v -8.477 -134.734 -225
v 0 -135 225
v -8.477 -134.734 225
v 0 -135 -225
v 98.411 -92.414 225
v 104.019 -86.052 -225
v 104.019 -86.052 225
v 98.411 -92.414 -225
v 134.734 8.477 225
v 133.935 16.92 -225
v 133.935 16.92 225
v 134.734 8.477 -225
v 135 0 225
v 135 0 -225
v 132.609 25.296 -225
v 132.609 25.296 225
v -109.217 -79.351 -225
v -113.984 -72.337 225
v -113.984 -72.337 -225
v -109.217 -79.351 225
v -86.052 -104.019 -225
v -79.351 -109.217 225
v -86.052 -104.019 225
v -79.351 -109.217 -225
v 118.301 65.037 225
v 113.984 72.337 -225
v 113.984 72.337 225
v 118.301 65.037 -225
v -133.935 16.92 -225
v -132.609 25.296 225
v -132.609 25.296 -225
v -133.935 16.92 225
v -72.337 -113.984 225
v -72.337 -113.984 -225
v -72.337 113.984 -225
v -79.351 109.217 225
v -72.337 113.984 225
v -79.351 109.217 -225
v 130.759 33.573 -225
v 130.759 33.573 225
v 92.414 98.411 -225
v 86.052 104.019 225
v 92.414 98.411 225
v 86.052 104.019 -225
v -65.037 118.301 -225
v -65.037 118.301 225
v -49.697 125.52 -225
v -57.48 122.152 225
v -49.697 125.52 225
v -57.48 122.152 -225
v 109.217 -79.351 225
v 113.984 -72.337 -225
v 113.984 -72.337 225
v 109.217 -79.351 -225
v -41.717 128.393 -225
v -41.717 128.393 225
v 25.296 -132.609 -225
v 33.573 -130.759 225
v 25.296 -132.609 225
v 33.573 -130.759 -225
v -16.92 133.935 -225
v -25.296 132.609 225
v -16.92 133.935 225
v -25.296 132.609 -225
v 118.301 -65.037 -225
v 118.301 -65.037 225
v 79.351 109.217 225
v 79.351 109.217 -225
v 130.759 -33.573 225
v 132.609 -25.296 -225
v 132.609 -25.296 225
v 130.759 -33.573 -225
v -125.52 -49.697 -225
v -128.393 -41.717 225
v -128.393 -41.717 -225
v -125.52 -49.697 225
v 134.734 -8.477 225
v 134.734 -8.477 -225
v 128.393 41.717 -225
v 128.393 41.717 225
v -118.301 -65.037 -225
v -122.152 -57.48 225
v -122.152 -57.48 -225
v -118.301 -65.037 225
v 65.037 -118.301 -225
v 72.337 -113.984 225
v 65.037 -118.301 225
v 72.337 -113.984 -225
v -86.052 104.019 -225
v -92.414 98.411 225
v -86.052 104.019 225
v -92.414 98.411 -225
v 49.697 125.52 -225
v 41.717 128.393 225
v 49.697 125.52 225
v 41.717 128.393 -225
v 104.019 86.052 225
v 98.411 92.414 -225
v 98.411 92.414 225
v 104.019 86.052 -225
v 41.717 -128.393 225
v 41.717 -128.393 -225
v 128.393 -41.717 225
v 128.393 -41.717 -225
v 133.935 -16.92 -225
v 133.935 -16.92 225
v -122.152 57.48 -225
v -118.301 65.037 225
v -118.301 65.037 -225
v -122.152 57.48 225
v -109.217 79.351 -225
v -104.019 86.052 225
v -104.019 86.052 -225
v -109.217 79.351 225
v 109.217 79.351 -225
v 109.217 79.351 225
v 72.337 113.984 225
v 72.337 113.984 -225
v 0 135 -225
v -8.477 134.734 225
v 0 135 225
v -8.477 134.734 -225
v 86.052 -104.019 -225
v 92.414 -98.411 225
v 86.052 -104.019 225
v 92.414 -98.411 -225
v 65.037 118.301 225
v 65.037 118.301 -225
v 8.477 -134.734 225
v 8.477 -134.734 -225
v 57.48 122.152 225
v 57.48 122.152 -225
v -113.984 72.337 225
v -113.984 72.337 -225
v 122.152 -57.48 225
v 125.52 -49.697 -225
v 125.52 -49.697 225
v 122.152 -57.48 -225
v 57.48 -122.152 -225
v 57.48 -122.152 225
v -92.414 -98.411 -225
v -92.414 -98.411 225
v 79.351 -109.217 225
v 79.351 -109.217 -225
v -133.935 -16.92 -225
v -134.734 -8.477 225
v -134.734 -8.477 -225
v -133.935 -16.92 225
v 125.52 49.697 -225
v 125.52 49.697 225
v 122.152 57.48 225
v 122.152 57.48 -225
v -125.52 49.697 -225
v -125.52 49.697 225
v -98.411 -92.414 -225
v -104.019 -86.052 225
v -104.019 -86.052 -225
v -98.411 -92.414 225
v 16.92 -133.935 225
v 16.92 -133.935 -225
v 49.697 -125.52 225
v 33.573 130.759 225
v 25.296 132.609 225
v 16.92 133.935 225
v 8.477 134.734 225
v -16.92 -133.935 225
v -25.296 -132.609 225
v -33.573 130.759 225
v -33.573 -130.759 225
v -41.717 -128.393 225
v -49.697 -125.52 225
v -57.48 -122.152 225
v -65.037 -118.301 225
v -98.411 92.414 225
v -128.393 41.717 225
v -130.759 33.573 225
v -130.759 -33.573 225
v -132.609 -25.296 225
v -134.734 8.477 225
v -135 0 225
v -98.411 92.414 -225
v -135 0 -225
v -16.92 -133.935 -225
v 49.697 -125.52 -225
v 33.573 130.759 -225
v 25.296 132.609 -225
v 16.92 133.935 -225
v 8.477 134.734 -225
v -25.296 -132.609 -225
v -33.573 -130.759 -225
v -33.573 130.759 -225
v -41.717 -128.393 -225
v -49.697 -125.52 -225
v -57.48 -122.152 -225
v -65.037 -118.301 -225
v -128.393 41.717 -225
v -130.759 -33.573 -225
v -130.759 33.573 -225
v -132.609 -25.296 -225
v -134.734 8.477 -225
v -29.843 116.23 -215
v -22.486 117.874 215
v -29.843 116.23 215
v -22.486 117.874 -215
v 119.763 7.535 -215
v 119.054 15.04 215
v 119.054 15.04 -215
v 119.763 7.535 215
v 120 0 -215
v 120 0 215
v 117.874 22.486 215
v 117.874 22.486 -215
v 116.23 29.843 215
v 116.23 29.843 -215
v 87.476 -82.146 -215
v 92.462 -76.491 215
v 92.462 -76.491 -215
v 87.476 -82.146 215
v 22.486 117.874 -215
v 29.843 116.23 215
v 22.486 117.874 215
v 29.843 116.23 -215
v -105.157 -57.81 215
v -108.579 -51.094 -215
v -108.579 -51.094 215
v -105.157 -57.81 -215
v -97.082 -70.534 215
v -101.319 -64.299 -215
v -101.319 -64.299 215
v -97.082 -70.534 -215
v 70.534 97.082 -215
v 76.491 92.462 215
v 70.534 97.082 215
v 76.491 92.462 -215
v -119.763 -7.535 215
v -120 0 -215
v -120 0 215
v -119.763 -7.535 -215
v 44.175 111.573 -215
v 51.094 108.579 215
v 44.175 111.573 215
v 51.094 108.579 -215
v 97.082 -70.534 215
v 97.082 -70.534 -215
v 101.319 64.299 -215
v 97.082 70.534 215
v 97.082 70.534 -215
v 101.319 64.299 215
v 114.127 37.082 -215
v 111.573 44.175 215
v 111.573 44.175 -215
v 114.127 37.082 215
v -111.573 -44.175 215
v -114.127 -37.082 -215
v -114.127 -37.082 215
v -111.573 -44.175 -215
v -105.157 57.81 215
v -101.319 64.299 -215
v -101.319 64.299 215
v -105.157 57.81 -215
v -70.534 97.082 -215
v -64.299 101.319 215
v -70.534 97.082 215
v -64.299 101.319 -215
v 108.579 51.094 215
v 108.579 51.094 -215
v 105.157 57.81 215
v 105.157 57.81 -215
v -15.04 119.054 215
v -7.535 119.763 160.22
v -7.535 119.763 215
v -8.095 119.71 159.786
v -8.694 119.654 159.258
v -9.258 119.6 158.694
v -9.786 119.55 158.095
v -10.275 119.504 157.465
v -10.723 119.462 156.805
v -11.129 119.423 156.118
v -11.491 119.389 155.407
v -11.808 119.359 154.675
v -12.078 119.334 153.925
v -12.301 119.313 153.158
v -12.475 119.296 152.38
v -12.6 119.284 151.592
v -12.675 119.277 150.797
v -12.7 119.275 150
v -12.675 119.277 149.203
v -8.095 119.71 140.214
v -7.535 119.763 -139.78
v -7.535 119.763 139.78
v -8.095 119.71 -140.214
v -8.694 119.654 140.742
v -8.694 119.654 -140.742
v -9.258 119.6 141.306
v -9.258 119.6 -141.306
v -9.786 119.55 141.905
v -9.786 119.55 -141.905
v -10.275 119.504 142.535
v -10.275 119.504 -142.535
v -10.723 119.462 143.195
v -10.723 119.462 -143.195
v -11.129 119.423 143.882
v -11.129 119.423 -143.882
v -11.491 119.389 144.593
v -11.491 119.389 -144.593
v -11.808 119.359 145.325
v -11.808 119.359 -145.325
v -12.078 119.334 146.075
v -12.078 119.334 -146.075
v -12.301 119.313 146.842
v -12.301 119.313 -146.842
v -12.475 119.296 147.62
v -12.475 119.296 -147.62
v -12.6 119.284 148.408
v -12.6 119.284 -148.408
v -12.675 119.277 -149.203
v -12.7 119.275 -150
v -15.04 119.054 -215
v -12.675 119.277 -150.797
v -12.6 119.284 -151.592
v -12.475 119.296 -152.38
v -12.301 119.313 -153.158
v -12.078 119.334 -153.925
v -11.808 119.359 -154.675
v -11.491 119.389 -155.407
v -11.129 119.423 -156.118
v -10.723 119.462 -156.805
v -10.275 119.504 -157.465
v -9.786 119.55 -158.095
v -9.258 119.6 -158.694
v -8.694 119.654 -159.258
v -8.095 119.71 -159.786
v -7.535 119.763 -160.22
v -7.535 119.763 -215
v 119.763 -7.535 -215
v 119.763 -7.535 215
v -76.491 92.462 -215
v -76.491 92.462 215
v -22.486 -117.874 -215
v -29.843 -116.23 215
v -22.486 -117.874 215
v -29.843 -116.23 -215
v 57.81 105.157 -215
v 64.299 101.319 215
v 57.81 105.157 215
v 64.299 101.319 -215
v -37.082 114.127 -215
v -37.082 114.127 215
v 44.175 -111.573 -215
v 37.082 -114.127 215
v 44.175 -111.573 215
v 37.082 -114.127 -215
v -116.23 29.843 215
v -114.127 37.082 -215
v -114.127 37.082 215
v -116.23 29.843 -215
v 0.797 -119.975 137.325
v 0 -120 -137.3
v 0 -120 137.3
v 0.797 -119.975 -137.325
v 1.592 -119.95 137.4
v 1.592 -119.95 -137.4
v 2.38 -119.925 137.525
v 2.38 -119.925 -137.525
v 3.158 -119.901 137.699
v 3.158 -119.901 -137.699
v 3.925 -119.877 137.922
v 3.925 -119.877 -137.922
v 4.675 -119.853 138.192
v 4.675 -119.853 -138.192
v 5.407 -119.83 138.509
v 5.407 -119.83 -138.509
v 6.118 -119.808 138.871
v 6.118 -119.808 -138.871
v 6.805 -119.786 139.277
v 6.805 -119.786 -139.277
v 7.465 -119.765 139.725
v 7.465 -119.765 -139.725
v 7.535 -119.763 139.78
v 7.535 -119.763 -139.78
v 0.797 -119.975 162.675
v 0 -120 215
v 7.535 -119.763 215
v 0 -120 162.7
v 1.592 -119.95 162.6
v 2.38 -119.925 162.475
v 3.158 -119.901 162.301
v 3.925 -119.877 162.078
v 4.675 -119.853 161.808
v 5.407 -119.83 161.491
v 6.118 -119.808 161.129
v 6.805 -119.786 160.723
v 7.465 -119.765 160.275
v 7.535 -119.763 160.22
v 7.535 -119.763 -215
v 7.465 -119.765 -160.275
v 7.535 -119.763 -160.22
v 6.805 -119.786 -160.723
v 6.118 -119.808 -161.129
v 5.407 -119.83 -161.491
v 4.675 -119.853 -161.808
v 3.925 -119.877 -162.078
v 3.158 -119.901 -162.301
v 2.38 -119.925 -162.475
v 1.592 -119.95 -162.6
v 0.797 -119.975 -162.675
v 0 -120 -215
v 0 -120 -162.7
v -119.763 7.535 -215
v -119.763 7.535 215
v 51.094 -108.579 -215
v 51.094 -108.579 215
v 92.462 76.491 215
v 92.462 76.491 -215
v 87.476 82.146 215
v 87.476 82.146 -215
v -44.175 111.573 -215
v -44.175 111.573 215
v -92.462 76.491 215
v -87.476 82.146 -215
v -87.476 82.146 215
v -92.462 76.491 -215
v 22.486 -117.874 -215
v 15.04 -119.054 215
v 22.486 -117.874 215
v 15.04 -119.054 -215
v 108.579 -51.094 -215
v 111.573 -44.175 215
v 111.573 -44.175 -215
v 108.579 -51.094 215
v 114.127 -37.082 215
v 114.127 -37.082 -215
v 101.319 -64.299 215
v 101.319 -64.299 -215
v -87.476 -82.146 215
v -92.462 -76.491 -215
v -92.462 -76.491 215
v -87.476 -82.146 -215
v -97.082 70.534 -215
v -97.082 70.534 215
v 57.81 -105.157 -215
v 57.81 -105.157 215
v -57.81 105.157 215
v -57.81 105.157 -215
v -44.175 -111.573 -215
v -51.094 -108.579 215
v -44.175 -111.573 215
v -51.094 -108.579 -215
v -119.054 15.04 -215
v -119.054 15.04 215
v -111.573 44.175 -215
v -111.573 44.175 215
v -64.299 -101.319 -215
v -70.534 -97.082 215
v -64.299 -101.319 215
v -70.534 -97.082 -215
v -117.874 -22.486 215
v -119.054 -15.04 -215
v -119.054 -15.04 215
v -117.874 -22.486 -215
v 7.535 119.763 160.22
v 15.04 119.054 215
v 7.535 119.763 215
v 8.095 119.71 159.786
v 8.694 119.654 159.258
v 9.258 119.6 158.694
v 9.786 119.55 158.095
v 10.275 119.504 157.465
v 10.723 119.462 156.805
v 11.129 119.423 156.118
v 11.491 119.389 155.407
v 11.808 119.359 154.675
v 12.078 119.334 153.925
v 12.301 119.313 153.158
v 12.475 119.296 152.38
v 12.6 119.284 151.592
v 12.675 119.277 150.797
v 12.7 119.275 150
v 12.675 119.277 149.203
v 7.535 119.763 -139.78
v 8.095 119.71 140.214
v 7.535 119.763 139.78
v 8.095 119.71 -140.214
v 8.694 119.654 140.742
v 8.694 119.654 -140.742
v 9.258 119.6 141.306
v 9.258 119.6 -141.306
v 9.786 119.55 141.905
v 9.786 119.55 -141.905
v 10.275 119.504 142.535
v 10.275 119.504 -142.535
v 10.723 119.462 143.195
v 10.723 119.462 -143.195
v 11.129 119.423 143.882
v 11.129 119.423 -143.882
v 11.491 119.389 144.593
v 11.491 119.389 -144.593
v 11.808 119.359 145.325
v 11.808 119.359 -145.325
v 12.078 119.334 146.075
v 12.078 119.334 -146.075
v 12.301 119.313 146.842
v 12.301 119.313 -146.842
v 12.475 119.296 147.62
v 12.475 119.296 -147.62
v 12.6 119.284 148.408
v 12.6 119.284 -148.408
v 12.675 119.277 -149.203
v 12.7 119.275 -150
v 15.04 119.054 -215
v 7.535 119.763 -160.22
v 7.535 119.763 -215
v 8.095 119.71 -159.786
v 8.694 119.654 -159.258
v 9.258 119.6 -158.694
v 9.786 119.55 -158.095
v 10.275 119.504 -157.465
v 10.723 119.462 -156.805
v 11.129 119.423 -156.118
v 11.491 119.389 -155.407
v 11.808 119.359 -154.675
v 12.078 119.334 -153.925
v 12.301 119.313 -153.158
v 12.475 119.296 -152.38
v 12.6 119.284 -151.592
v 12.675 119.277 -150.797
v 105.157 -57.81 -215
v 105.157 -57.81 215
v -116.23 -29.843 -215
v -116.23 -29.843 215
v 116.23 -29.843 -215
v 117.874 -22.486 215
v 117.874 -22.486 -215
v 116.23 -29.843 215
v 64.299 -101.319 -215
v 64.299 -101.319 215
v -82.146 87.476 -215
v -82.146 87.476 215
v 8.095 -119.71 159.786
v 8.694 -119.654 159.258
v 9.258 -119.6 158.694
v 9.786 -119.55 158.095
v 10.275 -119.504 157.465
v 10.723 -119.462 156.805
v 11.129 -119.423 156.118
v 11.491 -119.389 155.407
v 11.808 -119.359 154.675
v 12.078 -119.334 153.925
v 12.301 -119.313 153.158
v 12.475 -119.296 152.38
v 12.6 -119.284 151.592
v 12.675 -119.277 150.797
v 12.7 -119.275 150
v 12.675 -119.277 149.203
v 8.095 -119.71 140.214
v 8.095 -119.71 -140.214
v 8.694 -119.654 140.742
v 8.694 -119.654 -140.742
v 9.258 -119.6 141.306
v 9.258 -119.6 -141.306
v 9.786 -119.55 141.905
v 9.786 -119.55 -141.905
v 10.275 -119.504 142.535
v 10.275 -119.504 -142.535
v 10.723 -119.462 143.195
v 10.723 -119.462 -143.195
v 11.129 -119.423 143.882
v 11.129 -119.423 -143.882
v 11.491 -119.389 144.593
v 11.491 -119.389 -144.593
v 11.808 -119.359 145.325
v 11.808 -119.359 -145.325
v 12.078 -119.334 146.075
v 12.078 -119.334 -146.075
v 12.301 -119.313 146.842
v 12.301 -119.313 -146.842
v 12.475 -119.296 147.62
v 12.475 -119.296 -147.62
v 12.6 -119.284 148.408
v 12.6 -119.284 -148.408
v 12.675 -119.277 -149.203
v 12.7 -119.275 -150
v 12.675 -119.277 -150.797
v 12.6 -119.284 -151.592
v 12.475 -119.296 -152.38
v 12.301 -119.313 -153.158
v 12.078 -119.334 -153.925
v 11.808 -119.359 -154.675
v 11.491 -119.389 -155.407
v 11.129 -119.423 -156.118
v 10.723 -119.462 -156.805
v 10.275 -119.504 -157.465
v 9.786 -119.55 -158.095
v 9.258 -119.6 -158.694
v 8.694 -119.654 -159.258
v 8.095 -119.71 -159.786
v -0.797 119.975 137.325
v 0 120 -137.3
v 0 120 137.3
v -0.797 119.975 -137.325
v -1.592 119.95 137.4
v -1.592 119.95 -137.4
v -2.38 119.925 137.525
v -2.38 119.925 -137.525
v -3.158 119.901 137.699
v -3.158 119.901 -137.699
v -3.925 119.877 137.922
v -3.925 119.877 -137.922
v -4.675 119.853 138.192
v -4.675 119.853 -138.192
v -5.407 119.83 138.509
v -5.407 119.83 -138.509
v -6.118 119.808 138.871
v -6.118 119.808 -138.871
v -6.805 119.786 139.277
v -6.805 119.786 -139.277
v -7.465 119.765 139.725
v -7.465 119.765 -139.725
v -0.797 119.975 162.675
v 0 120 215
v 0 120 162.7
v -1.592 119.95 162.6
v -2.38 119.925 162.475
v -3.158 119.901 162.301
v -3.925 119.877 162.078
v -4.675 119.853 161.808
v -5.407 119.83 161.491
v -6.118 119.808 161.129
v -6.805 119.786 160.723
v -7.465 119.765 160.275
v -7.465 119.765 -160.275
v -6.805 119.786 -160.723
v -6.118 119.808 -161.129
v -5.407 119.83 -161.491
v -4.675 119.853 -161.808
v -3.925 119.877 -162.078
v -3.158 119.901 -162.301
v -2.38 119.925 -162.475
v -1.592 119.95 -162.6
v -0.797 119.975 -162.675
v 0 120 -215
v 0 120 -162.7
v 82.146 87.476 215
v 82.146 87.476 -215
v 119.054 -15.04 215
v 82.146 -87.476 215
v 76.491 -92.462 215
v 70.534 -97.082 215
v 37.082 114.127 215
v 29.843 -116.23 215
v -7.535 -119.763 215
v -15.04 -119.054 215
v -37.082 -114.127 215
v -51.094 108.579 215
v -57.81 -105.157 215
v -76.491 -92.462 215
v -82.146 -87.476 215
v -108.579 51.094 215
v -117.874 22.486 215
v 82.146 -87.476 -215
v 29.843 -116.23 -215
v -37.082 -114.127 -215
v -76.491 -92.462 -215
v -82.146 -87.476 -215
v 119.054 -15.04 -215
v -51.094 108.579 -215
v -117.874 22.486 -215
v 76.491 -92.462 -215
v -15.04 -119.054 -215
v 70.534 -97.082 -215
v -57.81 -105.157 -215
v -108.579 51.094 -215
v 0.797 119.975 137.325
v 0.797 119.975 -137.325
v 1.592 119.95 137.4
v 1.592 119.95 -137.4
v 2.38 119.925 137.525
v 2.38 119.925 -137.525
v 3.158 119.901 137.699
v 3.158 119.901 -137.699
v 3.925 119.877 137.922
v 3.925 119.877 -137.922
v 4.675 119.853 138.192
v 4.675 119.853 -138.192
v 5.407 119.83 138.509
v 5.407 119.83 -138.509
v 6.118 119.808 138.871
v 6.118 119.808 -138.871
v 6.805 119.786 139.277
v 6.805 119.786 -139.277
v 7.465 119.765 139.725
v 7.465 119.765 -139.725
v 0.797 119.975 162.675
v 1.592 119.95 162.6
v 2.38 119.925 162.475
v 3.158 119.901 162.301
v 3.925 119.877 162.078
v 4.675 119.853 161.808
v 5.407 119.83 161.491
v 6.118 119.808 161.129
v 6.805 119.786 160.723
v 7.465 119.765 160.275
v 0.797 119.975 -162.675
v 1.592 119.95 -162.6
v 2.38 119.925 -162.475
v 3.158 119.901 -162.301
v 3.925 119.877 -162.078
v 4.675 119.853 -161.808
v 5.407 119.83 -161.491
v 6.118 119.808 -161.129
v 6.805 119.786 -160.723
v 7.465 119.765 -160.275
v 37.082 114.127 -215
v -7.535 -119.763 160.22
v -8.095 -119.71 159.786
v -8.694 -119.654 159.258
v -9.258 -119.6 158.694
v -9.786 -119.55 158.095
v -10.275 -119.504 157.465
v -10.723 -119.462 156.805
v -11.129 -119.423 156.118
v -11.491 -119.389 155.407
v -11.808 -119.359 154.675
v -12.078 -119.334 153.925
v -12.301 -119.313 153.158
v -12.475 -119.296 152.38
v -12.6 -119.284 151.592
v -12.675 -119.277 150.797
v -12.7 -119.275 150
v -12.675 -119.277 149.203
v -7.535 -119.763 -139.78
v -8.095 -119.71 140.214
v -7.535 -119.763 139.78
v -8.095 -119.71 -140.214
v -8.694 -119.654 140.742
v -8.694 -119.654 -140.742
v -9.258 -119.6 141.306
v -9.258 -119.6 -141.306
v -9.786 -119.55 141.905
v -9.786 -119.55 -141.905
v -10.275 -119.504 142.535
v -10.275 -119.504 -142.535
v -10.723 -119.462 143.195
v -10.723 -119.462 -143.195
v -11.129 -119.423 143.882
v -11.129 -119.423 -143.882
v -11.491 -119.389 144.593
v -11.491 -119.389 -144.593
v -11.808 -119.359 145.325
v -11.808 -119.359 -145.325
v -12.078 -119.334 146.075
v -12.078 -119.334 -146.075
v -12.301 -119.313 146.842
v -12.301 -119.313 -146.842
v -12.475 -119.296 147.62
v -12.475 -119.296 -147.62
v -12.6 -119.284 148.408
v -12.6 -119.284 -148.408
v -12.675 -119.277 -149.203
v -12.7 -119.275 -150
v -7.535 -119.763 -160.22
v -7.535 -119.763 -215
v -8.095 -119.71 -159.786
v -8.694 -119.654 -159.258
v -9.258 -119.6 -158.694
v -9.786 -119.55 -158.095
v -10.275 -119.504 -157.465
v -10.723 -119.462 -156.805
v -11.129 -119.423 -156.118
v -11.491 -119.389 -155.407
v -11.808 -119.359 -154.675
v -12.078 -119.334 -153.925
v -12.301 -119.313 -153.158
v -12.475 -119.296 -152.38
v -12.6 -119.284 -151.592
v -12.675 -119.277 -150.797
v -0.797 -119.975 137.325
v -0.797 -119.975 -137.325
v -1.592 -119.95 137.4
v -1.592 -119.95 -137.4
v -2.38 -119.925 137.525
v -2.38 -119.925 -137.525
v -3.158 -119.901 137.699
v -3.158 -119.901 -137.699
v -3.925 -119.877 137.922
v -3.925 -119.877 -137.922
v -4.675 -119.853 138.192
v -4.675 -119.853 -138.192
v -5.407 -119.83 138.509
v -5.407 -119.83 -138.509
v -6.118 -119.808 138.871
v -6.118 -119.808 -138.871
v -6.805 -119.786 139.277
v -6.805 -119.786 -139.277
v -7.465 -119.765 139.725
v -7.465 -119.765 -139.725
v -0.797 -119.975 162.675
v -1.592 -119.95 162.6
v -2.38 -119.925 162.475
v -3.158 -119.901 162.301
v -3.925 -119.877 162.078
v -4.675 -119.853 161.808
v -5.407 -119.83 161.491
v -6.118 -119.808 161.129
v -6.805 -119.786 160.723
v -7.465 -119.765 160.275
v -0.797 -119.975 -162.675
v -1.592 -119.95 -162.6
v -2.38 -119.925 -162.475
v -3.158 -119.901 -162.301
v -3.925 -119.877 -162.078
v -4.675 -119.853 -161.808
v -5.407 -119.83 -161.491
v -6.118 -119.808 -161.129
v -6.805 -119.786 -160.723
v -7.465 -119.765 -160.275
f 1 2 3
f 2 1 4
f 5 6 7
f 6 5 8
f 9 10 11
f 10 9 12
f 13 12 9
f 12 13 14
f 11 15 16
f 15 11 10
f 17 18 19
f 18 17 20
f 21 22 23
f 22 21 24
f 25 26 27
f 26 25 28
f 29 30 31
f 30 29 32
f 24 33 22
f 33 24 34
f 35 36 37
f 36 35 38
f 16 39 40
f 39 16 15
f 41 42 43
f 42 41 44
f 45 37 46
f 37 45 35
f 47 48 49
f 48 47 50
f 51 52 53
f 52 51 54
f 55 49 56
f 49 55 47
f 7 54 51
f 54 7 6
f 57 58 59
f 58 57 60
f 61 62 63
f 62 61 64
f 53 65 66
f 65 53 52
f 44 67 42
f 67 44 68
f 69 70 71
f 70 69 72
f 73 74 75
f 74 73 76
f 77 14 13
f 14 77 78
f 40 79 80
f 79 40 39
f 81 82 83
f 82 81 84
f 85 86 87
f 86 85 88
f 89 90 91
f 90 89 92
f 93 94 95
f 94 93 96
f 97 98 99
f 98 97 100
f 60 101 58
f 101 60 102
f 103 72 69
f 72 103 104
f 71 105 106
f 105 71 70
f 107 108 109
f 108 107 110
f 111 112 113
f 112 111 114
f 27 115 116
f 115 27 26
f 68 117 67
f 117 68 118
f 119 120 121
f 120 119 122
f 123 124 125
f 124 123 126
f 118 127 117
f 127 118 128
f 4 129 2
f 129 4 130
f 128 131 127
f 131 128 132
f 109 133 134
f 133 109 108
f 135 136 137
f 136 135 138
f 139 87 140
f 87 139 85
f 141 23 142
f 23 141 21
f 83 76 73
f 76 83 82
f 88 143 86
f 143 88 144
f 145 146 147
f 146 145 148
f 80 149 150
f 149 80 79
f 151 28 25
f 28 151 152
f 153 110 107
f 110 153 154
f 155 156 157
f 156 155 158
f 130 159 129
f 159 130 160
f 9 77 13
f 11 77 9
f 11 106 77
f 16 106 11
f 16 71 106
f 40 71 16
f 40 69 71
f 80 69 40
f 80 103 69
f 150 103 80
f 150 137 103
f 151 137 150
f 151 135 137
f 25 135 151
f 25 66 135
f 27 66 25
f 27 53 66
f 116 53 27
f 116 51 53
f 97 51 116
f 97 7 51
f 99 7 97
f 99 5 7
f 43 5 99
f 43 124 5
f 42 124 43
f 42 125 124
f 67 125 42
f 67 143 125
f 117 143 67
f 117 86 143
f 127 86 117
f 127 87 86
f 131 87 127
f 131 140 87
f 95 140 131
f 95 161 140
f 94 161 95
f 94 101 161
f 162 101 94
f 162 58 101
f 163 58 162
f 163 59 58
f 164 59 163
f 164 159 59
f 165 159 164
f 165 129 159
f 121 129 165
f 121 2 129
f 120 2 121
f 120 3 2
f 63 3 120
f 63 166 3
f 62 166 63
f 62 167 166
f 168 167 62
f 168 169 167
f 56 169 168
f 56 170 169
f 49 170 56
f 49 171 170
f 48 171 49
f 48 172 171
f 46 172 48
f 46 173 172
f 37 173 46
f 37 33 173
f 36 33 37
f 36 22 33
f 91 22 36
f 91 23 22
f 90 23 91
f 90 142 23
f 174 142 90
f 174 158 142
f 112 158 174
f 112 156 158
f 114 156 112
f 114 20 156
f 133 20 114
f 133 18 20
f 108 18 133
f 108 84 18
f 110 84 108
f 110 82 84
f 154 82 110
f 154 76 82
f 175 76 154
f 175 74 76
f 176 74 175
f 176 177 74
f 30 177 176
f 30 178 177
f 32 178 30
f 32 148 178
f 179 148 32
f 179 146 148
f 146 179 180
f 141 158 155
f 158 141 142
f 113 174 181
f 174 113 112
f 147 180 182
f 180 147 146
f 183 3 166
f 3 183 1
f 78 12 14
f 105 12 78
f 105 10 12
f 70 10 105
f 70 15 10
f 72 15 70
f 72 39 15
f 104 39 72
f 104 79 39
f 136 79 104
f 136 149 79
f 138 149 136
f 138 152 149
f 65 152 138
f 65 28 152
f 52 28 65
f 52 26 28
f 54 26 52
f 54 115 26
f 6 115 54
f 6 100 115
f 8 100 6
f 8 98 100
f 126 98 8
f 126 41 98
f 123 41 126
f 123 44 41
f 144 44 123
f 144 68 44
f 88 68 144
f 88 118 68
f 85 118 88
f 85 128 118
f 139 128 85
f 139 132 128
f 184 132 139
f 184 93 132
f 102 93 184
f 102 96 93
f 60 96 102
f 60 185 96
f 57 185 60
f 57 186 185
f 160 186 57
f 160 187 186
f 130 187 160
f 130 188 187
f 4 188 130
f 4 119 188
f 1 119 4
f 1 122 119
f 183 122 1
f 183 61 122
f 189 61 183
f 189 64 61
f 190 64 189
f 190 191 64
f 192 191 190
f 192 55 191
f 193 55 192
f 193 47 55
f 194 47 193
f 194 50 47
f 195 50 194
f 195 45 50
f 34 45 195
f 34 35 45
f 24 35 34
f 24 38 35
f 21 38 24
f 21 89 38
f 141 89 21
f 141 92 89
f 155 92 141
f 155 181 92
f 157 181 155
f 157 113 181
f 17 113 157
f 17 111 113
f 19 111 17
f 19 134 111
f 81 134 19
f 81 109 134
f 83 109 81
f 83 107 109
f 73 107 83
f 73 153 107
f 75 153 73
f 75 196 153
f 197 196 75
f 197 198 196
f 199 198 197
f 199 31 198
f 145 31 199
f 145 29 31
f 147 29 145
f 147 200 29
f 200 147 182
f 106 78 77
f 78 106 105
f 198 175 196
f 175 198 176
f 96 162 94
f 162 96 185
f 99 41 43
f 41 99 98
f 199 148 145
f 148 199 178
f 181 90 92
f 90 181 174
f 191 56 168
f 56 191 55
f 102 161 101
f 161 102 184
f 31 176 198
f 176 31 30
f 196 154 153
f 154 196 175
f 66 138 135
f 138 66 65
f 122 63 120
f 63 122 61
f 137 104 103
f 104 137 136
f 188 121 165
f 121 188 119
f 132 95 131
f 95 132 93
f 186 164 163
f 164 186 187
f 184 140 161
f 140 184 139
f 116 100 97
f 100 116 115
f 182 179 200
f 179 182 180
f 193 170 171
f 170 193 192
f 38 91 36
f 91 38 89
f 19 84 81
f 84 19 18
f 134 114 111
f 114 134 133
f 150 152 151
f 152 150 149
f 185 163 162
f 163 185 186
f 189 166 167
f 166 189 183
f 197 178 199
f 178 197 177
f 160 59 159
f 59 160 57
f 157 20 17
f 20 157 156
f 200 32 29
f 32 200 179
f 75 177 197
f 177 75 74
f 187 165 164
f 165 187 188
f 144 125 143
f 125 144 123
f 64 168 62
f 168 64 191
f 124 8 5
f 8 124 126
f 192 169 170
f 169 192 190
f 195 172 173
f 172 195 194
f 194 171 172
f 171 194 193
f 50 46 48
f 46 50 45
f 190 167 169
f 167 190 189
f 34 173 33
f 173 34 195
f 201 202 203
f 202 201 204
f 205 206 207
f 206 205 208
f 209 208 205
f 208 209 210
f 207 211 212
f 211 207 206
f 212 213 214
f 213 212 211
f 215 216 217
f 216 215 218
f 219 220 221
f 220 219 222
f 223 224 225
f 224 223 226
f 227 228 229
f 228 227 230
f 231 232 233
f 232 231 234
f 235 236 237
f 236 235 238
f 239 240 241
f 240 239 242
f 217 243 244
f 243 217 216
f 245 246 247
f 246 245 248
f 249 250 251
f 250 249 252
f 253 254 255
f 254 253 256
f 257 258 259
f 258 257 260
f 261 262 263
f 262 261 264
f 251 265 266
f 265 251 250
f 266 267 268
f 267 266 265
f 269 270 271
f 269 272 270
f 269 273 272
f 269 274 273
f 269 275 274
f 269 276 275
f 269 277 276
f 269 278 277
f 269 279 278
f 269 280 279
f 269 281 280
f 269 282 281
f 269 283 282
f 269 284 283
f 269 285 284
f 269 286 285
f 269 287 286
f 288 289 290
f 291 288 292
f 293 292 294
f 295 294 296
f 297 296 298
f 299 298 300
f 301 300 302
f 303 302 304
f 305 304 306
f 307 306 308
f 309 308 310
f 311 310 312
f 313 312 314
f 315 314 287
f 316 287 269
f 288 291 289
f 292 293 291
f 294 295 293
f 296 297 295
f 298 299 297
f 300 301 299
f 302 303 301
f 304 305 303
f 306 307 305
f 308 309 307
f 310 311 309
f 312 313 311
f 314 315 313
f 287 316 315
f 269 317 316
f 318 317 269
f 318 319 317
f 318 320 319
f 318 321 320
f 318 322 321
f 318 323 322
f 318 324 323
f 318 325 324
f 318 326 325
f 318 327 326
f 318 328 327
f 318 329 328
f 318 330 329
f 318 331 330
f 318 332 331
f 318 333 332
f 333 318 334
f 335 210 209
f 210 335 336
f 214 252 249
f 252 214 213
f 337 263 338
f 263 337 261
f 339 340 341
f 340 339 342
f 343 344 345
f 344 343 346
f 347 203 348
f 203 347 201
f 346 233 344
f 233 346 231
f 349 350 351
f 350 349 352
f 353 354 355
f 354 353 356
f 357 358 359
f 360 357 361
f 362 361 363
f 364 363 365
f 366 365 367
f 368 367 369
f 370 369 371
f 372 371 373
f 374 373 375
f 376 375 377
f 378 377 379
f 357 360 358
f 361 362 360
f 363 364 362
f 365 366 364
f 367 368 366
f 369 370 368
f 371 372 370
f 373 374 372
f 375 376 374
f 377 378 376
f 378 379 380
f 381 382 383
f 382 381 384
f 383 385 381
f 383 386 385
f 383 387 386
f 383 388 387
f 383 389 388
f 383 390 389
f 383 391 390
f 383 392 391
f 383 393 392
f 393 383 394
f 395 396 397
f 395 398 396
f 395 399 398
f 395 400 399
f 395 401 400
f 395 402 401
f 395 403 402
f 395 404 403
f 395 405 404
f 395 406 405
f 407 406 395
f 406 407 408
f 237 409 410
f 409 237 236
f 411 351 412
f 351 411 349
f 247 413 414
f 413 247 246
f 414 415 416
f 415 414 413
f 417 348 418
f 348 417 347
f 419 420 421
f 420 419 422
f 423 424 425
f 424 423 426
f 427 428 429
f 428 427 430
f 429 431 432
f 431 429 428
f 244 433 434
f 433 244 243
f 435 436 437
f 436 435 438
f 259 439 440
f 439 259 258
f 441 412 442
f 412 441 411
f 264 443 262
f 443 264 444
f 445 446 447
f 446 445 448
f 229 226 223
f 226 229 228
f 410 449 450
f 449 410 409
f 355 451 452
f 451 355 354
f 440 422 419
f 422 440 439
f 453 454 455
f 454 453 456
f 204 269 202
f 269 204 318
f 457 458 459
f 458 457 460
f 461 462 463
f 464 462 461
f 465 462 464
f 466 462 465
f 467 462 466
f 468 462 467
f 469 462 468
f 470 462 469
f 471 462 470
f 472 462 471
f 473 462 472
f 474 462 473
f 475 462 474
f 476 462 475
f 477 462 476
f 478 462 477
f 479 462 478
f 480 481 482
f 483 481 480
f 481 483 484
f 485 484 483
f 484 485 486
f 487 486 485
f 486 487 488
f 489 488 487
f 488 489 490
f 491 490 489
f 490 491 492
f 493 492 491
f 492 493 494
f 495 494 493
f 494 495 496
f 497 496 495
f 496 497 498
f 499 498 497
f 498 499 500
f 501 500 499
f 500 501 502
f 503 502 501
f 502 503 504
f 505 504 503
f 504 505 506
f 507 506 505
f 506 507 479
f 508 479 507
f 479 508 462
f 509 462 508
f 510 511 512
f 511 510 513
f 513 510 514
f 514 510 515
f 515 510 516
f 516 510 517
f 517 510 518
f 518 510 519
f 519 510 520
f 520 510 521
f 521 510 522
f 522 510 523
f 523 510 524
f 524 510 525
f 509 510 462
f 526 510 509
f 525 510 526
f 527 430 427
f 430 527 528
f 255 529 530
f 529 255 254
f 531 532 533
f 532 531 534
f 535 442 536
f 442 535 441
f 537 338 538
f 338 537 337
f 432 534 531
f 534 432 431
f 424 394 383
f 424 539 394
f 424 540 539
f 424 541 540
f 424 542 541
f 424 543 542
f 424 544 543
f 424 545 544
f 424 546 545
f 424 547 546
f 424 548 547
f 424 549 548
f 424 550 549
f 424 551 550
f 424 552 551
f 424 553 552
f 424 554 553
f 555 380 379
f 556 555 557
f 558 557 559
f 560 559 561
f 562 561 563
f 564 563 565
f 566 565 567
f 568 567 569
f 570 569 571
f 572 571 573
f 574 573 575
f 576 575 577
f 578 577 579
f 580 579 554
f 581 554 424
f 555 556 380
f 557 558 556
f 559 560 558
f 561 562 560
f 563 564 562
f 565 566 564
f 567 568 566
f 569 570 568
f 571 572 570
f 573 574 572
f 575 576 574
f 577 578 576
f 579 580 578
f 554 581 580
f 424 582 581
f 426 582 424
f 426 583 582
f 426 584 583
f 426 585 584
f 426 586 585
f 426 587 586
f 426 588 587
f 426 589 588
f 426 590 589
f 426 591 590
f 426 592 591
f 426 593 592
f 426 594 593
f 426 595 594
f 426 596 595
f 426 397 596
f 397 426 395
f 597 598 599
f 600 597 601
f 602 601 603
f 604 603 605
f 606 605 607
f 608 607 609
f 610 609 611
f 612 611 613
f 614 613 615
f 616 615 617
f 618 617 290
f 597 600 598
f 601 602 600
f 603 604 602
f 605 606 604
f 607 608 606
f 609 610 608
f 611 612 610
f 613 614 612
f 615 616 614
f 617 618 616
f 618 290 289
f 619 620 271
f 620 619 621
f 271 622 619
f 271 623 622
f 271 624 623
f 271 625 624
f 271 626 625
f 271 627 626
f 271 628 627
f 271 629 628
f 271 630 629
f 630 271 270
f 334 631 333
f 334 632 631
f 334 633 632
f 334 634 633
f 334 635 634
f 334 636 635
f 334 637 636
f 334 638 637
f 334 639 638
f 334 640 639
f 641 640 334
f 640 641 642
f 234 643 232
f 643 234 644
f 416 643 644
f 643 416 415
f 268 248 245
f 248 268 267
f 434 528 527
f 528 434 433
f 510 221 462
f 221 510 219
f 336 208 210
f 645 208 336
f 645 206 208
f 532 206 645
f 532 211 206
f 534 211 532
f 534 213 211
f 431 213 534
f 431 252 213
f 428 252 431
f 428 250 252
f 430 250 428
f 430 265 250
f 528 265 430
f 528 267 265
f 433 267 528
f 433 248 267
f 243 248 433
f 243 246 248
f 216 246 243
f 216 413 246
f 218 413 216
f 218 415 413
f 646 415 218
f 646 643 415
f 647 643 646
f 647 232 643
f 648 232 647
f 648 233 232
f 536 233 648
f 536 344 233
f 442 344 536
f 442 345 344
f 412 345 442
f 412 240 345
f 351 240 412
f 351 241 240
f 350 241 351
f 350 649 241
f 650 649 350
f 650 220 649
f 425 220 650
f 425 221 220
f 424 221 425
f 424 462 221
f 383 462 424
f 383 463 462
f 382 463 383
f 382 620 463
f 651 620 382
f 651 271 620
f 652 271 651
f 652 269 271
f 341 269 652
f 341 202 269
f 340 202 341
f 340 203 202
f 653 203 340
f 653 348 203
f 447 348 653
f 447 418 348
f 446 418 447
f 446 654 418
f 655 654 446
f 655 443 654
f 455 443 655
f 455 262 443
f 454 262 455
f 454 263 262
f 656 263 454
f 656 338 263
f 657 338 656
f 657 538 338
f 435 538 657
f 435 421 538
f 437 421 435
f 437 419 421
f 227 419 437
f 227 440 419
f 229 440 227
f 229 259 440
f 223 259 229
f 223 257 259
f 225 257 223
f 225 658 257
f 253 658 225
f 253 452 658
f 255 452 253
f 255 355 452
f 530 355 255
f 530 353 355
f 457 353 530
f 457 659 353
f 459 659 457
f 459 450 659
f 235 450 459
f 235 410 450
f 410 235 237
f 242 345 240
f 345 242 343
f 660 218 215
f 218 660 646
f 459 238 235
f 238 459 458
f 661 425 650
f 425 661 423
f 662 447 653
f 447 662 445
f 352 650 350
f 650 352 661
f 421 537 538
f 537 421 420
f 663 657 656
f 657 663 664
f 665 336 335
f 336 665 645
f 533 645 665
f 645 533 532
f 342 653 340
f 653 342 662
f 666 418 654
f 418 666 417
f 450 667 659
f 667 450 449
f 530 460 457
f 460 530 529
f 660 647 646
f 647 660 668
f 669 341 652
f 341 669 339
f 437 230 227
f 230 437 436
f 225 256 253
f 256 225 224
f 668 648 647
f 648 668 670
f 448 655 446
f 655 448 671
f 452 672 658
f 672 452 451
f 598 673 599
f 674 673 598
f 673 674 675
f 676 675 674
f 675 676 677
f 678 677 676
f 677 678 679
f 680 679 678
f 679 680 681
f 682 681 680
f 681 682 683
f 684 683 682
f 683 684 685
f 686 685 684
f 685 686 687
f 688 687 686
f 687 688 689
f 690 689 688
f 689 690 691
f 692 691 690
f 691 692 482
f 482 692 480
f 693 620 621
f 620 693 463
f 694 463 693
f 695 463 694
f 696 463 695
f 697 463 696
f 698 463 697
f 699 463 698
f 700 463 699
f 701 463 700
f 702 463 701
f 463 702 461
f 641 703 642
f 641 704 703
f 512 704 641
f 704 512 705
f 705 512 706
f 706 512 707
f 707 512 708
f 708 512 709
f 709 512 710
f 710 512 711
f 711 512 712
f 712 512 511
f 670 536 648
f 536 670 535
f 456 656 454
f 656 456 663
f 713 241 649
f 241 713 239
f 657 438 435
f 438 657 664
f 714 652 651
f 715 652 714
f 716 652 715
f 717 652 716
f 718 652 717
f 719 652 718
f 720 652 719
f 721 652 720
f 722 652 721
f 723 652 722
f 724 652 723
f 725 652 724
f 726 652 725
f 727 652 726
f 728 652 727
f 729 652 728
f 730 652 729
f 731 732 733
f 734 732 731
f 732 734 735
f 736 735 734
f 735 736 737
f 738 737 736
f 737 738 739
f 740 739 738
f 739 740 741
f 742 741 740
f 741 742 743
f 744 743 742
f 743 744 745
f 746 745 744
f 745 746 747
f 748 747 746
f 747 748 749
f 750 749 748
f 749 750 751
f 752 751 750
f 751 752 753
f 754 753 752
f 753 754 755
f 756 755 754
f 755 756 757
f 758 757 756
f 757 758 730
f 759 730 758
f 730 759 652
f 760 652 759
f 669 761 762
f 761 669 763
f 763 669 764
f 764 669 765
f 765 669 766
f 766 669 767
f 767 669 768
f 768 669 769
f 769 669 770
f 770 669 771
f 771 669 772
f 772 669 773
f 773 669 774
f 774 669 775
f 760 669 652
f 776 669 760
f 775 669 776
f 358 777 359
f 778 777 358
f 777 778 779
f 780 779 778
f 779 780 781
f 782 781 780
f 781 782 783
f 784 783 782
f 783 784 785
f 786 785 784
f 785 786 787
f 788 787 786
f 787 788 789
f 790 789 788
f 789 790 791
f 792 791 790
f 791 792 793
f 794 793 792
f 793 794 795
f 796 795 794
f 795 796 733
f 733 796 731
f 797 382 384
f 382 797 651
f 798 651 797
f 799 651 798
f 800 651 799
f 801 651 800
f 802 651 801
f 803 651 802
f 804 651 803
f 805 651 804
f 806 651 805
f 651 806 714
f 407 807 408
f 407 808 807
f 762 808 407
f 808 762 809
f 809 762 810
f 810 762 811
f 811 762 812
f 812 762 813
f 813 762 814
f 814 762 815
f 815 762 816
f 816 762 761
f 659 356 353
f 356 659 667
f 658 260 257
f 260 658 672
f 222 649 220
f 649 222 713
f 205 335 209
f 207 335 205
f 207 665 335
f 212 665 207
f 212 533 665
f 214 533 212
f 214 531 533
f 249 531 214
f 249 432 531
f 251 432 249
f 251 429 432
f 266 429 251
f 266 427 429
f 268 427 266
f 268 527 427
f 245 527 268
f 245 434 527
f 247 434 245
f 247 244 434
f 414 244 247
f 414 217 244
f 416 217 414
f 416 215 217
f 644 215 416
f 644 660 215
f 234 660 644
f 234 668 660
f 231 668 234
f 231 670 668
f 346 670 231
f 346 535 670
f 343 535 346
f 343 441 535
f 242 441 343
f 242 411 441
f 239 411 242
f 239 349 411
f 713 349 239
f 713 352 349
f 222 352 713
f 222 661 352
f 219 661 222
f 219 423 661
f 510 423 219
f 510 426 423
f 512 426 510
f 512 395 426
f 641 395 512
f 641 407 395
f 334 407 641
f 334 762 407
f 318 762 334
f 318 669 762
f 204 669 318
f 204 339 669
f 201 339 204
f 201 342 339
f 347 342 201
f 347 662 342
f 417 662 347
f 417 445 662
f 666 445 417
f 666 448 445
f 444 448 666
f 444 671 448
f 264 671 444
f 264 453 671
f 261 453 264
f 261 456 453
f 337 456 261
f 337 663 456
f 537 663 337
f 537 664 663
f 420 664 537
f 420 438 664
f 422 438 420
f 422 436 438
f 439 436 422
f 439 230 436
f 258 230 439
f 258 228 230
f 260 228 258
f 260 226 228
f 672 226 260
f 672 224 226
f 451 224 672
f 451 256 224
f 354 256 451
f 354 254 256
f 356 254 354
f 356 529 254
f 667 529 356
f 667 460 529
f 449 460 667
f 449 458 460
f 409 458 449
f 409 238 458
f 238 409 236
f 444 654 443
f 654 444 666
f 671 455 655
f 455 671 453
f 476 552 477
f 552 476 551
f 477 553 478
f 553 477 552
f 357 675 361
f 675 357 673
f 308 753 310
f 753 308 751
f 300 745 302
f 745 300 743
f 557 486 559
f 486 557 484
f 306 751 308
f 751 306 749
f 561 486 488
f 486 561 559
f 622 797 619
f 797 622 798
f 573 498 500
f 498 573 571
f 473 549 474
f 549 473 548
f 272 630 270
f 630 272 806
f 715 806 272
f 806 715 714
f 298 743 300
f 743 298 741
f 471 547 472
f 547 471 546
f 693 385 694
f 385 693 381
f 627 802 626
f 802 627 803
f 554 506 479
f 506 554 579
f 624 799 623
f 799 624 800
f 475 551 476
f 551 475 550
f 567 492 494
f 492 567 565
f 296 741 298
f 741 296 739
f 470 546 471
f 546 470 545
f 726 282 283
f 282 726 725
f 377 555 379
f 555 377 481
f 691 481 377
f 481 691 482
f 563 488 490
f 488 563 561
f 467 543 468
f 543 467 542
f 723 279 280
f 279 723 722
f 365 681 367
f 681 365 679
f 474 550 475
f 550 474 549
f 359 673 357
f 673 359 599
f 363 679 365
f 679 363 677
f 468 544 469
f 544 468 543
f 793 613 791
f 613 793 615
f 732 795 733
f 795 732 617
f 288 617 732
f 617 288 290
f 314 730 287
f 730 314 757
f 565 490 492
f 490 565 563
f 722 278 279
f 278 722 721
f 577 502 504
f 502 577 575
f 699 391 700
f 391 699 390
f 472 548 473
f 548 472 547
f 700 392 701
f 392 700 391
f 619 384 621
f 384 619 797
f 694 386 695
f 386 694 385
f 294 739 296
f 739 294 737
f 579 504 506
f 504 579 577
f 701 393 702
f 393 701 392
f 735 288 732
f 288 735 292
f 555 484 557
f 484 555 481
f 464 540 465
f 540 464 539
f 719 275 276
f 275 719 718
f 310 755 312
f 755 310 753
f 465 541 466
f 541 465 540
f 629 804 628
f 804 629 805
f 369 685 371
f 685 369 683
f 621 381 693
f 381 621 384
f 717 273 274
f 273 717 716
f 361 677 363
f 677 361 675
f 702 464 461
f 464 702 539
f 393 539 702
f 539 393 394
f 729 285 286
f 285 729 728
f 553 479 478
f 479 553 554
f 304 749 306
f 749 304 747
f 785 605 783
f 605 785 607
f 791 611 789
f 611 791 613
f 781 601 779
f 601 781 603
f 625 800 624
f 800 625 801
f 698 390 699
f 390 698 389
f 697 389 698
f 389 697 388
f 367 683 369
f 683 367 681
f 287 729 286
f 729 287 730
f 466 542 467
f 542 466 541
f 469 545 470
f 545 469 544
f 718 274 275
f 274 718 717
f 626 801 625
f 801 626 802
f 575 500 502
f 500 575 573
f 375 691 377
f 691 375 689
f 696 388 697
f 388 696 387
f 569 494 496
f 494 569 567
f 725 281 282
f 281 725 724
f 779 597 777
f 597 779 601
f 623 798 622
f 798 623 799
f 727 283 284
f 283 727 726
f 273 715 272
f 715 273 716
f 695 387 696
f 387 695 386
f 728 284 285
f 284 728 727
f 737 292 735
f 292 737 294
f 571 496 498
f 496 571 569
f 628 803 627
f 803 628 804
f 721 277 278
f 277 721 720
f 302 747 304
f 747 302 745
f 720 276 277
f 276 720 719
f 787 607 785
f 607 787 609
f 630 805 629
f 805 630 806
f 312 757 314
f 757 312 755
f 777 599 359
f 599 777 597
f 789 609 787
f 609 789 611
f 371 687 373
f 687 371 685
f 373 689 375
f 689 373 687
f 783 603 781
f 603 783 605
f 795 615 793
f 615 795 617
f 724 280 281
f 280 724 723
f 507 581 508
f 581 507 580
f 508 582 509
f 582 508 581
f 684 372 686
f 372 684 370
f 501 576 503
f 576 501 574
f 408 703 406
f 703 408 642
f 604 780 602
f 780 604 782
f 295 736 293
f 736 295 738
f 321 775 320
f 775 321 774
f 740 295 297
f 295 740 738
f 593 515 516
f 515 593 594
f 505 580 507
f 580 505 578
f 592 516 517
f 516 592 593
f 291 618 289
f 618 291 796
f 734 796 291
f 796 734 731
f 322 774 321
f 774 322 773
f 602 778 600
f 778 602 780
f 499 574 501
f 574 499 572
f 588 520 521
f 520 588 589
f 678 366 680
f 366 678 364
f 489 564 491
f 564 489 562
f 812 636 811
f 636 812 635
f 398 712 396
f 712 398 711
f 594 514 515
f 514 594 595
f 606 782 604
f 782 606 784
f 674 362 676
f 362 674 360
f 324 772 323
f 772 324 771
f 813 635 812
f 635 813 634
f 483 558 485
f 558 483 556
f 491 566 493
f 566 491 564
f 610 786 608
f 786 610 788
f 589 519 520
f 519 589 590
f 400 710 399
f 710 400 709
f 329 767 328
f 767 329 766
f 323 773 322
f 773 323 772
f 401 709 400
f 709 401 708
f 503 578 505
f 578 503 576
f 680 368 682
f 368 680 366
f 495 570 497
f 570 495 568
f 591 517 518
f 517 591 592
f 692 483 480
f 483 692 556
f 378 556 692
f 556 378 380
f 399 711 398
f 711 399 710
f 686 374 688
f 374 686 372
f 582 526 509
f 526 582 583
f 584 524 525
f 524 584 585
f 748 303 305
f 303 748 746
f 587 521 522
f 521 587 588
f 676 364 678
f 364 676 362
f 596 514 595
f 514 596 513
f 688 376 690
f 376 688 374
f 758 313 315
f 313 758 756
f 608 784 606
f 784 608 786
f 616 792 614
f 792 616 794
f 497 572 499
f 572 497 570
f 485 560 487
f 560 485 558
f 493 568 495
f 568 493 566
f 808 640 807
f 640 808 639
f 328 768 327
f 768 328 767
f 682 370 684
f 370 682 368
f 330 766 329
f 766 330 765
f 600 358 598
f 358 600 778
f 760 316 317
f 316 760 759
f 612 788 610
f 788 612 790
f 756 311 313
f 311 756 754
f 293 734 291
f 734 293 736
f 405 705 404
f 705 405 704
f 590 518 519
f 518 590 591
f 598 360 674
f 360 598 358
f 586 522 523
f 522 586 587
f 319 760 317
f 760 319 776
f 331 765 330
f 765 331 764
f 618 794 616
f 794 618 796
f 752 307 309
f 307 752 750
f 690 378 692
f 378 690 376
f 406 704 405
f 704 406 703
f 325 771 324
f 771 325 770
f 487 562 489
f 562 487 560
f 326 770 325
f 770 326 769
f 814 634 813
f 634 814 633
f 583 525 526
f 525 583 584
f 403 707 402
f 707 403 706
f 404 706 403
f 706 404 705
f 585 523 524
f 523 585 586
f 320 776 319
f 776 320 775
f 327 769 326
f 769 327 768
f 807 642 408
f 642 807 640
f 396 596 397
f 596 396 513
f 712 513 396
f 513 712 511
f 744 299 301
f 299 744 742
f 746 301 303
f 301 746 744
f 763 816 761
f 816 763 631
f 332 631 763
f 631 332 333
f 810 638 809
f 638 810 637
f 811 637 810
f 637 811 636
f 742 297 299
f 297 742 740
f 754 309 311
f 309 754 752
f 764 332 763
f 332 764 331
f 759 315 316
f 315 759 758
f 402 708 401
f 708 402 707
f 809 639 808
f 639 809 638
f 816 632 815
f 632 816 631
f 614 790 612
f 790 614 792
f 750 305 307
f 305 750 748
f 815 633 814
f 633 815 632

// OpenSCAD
// Fluid Conditioning Containment Vessel
$fn = 100; // Fragment resolution

vessel_height = 450;    // Structural height in mm
inner_radius = 120;     // Internal processing cavity radius in mm
jacket_thickness = 15;  // Thermal fluid jacket sleeve thickness in mm
port_diameter = 25.4;   // Tri-clamp interface utility port diameter in mm

module processing_core() {
    difference() {
        // Main Outer Shell
        cylinder(h=vessel_height, r=inner_radius + jacket_thickness, center=true);
        // Internal Cavity Excavation
        cylinder(h=vessel_height - 20, r=inner_radius, center=true);
    }
}

module inlet_port() {
    rotate([90, 0, 0])
    cylinder(h=inner_radius * 2, r=port_diameter / 2, center=true);
}

// Assemble full system geometry
union() {
    processing_core();
    translate([0, 0, vessel_height / 3]) inlet_port();
    translate([0, 0, -vessel_height / 3]) inlet_port();
}
